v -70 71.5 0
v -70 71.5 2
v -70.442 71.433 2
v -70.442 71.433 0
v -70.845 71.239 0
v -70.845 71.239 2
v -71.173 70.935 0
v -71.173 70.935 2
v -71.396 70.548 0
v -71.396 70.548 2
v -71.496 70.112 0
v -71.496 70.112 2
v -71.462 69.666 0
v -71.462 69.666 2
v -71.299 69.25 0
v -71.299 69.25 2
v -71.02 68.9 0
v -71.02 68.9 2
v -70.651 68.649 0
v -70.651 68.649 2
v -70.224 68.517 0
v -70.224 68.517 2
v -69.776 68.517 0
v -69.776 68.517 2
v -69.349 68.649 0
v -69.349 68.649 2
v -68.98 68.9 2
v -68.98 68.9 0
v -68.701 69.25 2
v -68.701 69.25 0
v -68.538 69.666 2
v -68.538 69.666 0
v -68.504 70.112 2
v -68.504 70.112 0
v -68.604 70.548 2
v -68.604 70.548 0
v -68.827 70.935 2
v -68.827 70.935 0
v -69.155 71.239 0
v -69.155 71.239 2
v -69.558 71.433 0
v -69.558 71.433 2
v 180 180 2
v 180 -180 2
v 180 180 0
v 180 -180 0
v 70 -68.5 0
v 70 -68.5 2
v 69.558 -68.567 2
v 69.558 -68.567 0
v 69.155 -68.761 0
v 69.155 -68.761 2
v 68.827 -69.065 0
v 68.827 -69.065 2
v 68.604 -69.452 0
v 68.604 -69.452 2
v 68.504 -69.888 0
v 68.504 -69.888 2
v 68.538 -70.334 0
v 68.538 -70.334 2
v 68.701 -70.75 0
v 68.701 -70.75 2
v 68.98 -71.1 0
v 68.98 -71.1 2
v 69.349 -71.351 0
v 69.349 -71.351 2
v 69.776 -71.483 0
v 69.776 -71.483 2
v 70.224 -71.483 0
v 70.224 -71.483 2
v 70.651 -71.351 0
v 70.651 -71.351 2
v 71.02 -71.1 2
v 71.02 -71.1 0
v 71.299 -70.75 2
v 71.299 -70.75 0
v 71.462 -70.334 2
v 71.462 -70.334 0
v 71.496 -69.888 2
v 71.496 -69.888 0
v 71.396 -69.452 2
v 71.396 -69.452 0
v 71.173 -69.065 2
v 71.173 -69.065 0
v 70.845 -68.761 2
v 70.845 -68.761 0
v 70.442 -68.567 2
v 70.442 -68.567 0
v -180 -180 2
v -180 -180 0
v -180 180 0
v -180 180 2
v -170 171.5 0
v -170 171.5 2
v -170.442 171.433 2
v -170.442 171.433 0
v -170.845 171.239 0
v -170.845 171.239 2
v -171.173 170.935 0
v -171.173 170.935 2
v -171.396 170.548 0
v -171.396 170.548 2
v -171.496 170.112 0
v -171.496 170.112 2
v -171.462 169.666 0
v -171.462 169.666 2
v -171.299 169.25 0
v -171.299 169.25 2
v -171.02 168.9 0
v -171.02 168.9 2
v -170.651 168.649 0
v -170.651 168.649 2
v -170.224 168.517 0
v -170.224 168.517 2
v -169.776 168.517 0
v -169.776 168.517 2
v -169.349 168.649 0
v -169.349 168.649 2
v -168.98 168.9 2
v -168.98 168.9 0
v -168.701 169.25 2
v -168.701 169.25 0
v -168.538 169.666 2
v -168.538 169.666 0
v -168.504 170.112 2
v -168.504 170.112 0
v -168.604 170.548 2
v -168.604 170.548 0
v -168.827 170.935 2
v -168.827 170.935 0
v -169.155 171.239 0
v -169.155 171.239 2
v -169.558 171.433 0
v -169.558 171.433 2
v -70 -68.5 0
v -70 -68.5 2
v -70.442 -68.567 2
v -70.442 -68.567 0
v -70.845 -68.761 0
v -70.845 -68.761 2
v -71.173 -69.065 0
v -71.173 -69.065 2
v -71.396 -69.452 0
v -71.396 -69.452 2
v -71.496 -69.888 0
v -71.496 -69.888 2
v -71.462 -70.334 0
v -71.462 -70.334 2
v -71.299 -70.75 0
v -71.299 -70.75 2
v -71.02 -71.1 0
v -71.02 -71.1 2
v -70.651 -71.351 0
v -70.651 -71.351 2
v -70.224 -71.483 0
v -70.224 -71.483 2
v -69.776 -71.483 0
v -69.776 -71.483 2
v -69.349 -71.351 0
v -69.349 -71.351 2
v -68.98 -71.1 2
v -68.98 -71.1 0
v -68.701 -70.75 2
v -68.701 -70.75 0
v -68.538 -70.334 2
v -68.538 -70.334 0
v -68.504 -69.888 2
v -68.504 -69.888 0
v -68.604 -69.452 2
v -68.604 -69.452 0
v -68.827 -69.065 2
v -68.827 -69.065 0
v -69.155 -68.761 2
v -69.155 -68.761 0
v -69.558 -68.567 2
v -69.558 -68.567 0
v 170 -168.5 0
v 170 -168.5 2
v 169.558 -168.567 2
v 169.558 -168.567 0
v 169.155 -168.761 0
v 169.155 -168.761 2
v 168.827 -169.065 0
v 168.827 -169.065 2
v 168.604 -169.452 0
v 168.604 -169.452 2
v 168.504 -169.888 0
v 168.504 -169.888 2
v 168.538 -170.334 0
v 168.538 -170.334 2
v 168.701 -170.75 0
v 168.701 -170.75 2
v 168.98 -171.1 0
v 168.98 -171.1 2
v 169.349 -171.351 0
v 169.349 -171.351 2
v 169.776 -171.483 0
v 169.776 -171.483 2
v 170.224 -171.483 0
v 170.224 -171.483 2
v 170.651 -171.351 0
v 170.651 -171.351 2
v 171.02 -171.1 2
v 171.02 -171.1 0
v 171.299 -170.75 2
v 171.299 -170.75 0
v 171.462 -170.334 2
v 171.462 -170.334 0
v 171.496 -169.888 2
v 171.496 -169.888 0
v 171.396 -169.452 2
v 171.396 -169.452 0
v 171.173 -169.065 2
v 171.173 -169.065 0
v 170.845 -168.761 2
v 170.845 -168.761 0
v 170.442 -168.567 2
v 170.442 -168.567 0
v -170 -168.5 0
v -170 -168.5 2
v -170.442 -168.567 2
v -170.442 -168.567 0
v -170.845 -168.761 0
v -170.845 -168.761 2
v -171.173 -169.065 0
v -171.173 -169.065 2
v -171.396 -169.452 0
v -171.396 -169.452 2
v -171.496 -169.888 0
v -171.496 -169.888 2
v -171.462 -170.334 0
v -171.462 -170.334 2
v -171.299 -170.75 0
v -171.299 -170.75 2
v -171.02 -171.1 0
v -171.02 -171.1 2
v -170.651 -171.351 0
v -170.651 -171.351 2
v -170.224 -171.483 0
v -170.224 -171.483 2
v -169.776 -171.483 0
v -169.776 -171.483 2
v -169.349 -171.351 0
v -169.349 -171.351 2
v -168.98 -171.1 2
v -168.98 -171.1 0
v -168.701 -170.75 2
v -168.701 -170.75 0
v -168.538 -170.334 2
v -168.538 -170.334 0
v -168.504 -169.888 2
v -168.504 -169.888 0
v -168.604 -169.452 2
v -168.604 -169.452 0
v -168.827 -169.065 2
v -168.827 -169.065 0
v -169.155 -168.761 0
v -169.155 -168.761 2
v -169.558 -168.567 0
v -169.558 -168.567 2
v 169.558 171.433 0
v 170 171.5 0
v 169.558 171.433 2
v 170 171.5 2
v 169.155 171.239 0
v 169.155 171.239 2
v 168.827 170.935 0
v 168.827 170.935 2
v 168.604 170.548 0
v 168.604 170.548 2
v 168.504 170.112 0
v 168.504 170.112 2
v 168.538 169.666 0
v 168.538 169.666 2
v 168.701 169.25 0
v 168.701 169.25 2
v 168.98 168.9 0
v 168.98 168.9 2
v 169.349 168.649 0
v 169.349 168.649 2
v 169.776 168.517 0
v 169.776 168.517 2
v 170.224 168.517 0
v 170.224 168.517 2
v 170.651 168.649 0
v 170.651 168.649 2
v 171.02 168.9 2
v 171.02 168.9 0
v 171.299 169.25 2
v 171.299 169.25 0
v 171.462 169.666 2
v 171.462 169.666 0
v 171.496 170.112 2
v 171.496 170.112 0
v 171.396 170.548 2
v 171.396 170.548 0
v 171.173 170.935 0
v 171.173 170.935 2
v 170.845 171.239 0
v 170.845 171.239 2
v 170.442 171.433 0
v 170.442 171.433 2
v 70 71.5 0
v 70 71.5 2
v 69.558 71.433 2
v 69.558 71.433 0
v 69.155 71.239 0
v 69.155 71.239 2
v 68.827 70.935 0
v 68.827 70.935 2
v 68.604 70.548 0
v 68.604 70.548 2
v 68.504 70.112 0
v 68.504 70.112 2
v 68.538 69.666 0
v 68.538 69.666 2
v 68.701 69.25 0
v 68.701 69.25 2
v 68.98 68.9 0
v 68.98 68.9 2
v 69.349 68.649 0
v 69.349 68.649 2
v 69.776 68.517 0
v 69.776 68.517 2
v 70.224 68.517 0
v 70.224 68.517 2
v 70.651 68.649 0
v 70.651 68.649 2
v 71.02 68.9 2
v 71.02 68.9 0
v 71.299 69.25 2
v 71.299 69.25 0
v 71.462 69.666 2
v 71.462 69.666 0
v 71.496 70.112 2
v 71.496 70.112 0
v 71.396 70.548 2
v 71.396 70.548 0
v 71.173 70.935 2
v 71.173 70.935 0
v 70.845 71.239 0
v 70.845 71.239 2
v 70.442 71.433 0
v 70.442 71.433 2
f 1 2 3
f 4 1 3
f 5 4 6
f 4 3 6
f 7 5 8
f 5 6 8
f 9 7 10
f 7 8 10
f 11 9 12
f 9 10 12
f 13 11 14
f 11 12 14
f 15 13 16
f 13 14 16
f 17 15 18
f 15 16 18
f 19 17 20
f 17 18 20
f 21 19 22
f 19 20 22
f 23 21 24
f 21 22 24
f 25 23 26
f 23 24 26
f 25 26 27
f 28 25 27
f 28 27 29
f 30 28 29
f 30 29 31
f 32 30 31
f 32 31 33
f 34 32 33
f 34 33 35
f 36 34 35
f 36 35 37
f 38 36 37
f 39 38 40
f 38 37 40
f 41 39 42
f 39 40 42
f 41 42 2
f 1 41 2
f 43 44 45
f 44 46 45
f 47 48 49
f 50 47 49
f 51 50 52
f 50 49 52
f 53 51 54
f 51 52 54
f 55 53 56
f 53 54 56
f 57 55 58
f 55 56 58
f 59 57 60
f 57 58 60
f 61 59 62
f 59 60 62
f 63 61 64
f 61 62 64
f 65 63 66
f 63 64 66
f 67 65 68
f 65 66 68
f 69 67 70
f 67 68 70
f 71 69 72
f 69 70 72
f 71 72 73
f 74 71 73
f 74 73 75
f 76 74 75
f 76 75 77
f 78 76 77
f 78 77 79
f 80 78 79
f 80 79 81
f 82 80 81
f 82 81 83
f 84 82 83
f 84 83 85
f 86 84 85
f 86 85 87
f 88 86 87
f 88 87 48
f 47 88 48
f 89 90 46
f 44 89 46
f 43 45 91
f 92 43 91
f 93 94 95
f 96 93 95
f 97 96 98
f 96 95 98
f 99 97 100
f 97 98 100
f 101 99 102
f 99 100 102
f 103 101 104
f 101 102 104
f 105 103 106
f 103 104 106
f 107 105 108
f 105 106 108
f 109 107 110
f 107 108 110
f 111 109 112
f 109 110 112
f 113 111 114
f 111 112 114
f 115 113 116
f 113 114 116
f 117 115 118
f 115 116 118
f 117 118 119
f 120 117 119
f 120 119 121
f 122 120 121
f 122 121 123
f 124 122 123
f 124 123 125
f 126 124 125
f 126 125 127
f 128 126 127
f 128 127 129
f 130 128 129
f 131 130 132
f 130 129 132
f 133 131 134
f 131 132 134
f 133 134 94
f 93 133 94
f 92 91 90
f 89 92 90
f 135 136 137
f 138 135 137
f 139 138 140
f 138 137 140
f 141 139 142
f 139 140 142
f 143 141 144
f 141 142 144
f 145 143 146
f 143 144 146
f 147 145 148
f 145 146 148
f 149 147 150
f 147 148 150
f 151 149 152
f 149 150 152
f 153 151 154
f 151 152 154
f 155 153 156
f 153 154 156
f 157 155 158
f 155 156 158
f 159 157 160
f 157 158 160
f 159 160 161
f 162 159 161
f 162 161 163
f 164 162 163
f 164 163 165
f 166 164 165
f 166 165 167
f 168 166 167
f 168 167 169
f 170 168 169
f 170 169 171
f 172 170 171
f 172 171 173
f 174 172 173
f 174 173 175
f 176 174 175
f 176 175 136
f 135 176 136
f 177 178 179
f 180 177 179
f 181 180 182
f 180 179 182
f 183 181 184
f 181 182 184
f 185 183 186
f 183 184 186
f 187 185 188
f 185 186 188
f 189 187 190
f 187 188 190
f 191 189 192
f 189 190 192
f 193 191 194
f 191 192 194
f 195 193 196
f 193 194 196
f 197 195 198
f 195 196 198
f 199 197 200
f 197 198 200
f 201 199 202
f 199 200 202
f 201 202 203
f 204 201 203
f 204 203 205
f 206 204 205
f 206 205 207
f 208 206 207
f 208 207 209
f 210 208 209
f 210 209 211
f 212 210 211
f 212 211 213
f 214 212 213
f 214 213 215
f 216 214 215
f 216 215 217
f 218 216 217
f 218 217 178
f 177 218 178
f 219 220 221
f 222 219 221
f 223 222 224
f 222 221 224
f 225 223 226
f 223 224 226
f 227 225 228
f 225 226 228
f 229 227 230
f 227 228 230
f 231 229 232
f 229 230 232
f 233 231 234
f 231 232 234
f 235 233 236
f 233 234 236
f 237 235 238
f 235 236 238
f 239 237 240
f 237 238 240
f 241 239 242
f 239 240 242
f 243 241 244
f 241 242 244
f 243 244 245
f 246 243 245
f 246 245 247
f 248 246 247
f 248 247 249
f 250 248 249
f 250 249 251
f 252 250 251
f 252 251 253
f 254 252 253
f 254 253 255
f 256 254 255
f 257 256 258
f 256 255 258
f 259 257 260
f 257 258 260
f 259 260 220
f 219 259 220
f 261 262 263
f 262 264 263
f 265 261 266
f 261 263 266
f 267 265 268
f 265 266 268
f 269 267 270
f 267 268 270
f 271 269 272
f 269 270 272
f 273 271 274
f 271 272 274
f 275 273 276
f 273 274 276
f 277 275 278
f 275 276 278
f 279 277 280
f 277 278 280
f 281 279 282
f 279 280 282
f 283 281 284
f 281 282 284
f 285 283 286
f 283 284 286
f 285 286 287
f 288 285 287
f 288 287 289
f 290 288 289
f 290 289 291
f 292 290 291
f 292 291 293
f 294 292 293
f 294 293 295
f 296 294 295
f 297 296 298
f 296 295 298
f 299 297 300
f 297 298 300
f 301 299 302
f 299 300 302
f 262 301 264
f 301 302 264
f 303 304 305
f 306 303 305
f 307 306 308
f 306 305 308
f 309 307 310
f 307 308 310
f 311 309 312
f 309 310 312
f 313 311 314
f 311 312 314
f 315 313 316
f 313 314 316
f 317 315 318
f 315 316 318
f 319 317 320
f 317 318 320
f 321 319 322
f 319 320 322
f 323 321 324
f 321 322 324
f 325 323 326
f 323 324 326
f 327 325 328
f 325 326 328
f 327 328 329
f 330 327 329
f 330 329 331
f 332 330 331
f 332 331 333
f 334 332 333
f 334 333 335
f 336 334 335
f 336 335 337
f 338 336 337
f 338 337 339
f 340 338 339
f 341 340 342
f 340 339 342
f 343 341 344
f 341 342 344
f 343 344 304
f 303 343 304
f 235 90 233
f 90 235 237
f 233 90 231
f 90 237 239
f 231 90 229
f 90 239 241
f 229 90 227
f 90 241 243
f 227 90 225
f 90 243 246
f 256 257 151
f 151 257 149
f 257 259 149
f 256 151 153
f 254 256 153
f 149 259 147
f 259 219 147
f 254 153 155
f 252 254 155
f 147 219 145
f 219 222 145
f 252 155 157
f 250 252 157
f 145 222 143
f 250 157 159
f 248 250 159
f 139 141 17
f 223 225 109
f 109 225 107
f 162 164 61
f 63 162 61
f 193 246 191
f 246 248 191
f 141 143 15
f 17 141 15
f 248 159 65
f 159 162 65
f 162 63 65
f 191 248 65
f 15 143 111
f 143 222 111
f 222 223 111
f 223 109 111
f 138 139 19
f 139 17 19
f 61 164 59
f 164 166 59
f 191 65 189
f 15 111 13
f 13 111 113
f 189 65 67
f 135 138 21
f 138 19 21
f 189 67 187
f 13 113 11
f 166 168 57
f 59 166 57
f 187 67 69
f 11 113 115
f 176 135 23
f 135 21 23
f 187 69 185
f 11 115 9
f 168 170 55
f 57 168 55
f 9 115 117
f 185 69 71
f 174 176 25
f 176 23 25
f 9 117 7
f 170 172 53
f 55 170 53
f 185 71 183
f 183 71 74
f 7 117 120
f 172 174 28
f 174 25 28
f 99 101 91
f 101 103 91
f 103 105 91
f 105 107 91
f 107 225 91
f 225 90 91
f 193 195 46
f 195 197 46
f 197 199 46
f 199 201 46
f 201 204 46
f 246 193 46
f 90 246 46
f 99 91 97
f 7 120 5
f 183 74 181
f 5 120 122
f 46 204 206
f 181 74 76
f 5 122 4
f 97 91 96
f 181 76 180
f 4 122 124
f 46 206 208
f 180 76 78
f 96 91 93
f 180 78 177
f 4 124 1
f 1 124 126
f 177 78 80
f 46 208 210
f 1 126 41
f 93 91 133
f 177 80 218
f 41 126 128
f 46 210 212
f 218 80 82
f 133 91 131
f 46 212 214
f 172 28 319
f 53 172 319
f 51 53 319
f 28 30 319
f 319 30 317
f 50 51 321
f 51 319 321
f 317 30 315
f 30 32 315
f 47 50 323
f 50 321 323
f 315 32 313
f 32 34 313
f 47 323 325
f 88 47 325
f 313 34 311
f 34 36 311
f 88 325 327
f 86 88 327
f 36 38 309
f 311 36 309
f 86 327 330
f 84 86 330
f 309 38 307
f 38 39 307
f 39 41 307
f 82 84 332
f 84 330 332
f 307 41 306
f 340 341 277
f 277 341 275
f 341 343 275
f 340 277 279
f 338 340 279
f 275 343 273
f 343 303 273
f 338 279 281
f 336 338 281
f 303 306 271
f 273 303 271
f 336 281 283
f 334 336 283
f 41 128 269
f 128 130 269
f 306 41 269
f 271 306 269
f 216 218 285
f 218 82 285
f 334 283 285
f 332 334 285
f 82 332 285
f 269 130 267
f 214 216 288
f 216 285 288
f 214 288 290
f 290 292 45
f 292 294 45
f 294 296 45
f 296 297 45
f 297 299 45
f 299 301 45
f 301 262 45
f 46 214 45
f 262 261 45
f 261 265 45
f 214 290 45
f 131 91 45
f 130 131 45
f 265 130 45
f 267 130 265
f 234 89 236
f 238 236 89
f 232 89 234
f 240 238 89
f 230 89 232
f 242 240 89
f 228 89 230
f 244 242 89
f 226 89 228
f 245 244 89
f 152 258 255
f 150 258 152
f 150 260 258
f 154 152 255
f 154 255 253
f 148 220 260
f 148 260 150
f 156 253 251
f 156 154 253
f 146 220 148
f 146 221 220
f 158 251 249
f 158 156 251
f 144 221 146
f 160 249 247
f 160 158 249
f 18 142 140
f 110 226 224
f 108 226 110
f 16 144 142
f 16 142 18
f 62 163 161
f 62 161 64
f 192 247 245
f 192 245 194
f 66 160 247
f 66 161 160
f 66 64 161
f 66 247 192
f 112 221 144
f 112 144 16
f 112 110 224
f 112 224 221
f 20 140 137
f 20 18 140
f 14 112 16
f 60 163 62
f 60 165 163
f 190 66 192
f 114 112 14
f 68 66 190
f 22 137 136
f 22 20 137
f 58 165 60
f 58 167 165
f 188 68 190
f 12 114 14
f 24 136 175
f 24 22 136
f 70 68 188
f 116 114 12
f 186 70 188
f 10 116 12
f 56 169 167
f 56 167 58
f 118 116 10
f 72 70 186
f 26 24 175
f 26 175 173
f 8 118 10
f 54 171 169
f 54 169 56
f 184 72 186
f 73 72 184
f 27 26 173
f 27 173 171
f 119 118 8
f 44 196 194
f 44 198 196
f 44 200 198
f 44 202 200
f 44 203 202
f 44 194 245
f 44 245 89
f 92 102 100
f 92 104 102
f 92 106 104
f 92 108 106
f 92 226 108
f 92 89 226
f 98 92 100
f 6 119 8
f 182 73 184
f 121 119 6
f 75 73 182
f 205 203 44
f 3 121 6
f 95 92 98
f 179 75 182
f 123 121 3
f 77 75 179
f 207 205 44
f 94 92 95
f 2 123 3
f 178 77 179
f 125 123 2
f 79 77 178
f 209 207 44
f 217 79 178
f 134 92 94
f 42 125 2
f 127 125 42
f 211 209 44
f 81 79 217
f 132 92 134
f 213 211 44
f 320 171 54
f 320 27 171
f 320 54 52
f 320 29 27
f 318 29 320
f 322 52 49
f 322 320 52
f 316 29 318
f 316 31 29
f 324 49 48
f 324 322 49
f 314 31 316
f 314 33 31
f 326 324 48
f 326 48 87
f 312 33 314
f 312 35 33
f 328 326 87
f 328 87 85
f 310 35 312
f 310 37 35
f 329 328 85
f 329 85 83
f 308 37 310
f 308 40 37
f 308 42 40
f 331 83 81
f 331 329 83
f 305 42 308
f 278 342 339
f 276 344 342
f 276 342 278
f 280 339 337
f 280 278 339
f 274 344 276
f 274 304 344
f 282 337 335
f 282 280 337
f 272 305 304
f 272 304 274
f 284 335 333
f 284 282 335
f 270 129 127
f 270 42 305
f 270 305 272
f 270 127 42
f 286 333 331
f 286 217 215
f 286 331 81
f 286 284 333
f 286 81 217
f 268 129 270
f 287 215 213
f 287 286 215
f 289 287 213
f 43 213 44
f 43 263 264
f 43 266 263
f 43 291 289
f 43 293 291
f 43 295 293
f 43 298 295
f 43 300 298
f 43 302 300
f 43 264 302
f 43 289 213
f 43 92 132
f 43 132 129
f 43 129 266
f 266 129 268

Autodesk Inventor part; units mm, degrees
ref_plane "YZ Plane" through (0, 0, 0) normal (1, 0, 0) x (0, 1, 0)
ref_plane "XZ Plane" through (0, 0, 0) normal (0, 1, 0) x (-1, 0, 0)
ref_plane "XY Plane" through (0, 0, 0) normal (0, 0, 1) x (1, 0, 0)
sketch "Skizze1" plane through (0, 0, 0) normal (0, 0, 1) x (1, 0, 0)
  line L0 (-180, -180) -> (180, -180)
  line L1 (180, -180) -> (180, 180)
  line L2 (180, 180) -> (-180, 180)
  line L3 (-180, 180) -> (-180, -180)
  line L4 (-180, -180) -> (180, 180) construction
  line L5 (180, -180) -> (-180, 180) construction
  point P0 (0, 0)
  dimension "d0" = 360
  dimension "d1" = 360
extrude "Extrusion1" add sketch "Skizze1" along normal blind 2
hole "Bohrung1" at (-170, -170, 0) direction (0, 0, 1) diameter 3 end through all
pattern_linear "Rechteckige Anordnung1" count 2 spacing 340 along (1, 0, 0) count 2 spacing 340 along (0, 1, 0) of "Bohrung1"
hole "Bohrung2" at (-70, -70, 0) direction (0, 0, 1) diameter 3 end through all
pattern_linear "Rechteckige Anordnung2" count 2 spacing 140 along (1, 0, 0) count 2 spacing 140 along (0, 1, 0) of "Bohrung2"
sketch "Skizze2" plane through (0, 0, 2) normal (0, 0, 1) x (1, 0, 0)
  circle A0 centre (70, 70) radius 1.5 projected
  circle A1 centre (-70, 70) radius 1.5 projected
  circle A2 centre (70, -70) radius 1.5 projected
  circle A3 centre (-70, -70) radius 1.5 projected
  circle A4 centre (170, 170) radius 1.5 projected
  circle A5 centre (-170, 170) radius 1.5 projected
  circle A6 centre (-170, -170) radius 1.5 projected
  line L0 (-180, -180) -> (180, -180) projected
  line L1 (180, -180) -> (180, 180) projected
  line L2 (180, 180) -> (-180, 180) projected
  line L3 (-180, 180) -> (-180, -180) projected
  line L4 (-180, 180) -> (-110, 180)
  line L5 (-110, 180) -> (-110, 170)
  line L6 (-110, 170) -> (-180, 170)
  line L7 (-180, 170) -> (-180, 180)
  line L8 (180, -180) -> (170, -180) construction
  line L9 (170, -180) -> (170, -70) construction
  line L10 (170, -70) -> (180, -70) construction
  line L11 (180, -70) -> (180, -180) construction
  point P0 (0, 0)
  dimension "d34" = 70
  dimension "d35" = 10
  dimension "d38" = 10
  dimension "d39" = 110
properties part number "Platine" material "Platinengrün"
